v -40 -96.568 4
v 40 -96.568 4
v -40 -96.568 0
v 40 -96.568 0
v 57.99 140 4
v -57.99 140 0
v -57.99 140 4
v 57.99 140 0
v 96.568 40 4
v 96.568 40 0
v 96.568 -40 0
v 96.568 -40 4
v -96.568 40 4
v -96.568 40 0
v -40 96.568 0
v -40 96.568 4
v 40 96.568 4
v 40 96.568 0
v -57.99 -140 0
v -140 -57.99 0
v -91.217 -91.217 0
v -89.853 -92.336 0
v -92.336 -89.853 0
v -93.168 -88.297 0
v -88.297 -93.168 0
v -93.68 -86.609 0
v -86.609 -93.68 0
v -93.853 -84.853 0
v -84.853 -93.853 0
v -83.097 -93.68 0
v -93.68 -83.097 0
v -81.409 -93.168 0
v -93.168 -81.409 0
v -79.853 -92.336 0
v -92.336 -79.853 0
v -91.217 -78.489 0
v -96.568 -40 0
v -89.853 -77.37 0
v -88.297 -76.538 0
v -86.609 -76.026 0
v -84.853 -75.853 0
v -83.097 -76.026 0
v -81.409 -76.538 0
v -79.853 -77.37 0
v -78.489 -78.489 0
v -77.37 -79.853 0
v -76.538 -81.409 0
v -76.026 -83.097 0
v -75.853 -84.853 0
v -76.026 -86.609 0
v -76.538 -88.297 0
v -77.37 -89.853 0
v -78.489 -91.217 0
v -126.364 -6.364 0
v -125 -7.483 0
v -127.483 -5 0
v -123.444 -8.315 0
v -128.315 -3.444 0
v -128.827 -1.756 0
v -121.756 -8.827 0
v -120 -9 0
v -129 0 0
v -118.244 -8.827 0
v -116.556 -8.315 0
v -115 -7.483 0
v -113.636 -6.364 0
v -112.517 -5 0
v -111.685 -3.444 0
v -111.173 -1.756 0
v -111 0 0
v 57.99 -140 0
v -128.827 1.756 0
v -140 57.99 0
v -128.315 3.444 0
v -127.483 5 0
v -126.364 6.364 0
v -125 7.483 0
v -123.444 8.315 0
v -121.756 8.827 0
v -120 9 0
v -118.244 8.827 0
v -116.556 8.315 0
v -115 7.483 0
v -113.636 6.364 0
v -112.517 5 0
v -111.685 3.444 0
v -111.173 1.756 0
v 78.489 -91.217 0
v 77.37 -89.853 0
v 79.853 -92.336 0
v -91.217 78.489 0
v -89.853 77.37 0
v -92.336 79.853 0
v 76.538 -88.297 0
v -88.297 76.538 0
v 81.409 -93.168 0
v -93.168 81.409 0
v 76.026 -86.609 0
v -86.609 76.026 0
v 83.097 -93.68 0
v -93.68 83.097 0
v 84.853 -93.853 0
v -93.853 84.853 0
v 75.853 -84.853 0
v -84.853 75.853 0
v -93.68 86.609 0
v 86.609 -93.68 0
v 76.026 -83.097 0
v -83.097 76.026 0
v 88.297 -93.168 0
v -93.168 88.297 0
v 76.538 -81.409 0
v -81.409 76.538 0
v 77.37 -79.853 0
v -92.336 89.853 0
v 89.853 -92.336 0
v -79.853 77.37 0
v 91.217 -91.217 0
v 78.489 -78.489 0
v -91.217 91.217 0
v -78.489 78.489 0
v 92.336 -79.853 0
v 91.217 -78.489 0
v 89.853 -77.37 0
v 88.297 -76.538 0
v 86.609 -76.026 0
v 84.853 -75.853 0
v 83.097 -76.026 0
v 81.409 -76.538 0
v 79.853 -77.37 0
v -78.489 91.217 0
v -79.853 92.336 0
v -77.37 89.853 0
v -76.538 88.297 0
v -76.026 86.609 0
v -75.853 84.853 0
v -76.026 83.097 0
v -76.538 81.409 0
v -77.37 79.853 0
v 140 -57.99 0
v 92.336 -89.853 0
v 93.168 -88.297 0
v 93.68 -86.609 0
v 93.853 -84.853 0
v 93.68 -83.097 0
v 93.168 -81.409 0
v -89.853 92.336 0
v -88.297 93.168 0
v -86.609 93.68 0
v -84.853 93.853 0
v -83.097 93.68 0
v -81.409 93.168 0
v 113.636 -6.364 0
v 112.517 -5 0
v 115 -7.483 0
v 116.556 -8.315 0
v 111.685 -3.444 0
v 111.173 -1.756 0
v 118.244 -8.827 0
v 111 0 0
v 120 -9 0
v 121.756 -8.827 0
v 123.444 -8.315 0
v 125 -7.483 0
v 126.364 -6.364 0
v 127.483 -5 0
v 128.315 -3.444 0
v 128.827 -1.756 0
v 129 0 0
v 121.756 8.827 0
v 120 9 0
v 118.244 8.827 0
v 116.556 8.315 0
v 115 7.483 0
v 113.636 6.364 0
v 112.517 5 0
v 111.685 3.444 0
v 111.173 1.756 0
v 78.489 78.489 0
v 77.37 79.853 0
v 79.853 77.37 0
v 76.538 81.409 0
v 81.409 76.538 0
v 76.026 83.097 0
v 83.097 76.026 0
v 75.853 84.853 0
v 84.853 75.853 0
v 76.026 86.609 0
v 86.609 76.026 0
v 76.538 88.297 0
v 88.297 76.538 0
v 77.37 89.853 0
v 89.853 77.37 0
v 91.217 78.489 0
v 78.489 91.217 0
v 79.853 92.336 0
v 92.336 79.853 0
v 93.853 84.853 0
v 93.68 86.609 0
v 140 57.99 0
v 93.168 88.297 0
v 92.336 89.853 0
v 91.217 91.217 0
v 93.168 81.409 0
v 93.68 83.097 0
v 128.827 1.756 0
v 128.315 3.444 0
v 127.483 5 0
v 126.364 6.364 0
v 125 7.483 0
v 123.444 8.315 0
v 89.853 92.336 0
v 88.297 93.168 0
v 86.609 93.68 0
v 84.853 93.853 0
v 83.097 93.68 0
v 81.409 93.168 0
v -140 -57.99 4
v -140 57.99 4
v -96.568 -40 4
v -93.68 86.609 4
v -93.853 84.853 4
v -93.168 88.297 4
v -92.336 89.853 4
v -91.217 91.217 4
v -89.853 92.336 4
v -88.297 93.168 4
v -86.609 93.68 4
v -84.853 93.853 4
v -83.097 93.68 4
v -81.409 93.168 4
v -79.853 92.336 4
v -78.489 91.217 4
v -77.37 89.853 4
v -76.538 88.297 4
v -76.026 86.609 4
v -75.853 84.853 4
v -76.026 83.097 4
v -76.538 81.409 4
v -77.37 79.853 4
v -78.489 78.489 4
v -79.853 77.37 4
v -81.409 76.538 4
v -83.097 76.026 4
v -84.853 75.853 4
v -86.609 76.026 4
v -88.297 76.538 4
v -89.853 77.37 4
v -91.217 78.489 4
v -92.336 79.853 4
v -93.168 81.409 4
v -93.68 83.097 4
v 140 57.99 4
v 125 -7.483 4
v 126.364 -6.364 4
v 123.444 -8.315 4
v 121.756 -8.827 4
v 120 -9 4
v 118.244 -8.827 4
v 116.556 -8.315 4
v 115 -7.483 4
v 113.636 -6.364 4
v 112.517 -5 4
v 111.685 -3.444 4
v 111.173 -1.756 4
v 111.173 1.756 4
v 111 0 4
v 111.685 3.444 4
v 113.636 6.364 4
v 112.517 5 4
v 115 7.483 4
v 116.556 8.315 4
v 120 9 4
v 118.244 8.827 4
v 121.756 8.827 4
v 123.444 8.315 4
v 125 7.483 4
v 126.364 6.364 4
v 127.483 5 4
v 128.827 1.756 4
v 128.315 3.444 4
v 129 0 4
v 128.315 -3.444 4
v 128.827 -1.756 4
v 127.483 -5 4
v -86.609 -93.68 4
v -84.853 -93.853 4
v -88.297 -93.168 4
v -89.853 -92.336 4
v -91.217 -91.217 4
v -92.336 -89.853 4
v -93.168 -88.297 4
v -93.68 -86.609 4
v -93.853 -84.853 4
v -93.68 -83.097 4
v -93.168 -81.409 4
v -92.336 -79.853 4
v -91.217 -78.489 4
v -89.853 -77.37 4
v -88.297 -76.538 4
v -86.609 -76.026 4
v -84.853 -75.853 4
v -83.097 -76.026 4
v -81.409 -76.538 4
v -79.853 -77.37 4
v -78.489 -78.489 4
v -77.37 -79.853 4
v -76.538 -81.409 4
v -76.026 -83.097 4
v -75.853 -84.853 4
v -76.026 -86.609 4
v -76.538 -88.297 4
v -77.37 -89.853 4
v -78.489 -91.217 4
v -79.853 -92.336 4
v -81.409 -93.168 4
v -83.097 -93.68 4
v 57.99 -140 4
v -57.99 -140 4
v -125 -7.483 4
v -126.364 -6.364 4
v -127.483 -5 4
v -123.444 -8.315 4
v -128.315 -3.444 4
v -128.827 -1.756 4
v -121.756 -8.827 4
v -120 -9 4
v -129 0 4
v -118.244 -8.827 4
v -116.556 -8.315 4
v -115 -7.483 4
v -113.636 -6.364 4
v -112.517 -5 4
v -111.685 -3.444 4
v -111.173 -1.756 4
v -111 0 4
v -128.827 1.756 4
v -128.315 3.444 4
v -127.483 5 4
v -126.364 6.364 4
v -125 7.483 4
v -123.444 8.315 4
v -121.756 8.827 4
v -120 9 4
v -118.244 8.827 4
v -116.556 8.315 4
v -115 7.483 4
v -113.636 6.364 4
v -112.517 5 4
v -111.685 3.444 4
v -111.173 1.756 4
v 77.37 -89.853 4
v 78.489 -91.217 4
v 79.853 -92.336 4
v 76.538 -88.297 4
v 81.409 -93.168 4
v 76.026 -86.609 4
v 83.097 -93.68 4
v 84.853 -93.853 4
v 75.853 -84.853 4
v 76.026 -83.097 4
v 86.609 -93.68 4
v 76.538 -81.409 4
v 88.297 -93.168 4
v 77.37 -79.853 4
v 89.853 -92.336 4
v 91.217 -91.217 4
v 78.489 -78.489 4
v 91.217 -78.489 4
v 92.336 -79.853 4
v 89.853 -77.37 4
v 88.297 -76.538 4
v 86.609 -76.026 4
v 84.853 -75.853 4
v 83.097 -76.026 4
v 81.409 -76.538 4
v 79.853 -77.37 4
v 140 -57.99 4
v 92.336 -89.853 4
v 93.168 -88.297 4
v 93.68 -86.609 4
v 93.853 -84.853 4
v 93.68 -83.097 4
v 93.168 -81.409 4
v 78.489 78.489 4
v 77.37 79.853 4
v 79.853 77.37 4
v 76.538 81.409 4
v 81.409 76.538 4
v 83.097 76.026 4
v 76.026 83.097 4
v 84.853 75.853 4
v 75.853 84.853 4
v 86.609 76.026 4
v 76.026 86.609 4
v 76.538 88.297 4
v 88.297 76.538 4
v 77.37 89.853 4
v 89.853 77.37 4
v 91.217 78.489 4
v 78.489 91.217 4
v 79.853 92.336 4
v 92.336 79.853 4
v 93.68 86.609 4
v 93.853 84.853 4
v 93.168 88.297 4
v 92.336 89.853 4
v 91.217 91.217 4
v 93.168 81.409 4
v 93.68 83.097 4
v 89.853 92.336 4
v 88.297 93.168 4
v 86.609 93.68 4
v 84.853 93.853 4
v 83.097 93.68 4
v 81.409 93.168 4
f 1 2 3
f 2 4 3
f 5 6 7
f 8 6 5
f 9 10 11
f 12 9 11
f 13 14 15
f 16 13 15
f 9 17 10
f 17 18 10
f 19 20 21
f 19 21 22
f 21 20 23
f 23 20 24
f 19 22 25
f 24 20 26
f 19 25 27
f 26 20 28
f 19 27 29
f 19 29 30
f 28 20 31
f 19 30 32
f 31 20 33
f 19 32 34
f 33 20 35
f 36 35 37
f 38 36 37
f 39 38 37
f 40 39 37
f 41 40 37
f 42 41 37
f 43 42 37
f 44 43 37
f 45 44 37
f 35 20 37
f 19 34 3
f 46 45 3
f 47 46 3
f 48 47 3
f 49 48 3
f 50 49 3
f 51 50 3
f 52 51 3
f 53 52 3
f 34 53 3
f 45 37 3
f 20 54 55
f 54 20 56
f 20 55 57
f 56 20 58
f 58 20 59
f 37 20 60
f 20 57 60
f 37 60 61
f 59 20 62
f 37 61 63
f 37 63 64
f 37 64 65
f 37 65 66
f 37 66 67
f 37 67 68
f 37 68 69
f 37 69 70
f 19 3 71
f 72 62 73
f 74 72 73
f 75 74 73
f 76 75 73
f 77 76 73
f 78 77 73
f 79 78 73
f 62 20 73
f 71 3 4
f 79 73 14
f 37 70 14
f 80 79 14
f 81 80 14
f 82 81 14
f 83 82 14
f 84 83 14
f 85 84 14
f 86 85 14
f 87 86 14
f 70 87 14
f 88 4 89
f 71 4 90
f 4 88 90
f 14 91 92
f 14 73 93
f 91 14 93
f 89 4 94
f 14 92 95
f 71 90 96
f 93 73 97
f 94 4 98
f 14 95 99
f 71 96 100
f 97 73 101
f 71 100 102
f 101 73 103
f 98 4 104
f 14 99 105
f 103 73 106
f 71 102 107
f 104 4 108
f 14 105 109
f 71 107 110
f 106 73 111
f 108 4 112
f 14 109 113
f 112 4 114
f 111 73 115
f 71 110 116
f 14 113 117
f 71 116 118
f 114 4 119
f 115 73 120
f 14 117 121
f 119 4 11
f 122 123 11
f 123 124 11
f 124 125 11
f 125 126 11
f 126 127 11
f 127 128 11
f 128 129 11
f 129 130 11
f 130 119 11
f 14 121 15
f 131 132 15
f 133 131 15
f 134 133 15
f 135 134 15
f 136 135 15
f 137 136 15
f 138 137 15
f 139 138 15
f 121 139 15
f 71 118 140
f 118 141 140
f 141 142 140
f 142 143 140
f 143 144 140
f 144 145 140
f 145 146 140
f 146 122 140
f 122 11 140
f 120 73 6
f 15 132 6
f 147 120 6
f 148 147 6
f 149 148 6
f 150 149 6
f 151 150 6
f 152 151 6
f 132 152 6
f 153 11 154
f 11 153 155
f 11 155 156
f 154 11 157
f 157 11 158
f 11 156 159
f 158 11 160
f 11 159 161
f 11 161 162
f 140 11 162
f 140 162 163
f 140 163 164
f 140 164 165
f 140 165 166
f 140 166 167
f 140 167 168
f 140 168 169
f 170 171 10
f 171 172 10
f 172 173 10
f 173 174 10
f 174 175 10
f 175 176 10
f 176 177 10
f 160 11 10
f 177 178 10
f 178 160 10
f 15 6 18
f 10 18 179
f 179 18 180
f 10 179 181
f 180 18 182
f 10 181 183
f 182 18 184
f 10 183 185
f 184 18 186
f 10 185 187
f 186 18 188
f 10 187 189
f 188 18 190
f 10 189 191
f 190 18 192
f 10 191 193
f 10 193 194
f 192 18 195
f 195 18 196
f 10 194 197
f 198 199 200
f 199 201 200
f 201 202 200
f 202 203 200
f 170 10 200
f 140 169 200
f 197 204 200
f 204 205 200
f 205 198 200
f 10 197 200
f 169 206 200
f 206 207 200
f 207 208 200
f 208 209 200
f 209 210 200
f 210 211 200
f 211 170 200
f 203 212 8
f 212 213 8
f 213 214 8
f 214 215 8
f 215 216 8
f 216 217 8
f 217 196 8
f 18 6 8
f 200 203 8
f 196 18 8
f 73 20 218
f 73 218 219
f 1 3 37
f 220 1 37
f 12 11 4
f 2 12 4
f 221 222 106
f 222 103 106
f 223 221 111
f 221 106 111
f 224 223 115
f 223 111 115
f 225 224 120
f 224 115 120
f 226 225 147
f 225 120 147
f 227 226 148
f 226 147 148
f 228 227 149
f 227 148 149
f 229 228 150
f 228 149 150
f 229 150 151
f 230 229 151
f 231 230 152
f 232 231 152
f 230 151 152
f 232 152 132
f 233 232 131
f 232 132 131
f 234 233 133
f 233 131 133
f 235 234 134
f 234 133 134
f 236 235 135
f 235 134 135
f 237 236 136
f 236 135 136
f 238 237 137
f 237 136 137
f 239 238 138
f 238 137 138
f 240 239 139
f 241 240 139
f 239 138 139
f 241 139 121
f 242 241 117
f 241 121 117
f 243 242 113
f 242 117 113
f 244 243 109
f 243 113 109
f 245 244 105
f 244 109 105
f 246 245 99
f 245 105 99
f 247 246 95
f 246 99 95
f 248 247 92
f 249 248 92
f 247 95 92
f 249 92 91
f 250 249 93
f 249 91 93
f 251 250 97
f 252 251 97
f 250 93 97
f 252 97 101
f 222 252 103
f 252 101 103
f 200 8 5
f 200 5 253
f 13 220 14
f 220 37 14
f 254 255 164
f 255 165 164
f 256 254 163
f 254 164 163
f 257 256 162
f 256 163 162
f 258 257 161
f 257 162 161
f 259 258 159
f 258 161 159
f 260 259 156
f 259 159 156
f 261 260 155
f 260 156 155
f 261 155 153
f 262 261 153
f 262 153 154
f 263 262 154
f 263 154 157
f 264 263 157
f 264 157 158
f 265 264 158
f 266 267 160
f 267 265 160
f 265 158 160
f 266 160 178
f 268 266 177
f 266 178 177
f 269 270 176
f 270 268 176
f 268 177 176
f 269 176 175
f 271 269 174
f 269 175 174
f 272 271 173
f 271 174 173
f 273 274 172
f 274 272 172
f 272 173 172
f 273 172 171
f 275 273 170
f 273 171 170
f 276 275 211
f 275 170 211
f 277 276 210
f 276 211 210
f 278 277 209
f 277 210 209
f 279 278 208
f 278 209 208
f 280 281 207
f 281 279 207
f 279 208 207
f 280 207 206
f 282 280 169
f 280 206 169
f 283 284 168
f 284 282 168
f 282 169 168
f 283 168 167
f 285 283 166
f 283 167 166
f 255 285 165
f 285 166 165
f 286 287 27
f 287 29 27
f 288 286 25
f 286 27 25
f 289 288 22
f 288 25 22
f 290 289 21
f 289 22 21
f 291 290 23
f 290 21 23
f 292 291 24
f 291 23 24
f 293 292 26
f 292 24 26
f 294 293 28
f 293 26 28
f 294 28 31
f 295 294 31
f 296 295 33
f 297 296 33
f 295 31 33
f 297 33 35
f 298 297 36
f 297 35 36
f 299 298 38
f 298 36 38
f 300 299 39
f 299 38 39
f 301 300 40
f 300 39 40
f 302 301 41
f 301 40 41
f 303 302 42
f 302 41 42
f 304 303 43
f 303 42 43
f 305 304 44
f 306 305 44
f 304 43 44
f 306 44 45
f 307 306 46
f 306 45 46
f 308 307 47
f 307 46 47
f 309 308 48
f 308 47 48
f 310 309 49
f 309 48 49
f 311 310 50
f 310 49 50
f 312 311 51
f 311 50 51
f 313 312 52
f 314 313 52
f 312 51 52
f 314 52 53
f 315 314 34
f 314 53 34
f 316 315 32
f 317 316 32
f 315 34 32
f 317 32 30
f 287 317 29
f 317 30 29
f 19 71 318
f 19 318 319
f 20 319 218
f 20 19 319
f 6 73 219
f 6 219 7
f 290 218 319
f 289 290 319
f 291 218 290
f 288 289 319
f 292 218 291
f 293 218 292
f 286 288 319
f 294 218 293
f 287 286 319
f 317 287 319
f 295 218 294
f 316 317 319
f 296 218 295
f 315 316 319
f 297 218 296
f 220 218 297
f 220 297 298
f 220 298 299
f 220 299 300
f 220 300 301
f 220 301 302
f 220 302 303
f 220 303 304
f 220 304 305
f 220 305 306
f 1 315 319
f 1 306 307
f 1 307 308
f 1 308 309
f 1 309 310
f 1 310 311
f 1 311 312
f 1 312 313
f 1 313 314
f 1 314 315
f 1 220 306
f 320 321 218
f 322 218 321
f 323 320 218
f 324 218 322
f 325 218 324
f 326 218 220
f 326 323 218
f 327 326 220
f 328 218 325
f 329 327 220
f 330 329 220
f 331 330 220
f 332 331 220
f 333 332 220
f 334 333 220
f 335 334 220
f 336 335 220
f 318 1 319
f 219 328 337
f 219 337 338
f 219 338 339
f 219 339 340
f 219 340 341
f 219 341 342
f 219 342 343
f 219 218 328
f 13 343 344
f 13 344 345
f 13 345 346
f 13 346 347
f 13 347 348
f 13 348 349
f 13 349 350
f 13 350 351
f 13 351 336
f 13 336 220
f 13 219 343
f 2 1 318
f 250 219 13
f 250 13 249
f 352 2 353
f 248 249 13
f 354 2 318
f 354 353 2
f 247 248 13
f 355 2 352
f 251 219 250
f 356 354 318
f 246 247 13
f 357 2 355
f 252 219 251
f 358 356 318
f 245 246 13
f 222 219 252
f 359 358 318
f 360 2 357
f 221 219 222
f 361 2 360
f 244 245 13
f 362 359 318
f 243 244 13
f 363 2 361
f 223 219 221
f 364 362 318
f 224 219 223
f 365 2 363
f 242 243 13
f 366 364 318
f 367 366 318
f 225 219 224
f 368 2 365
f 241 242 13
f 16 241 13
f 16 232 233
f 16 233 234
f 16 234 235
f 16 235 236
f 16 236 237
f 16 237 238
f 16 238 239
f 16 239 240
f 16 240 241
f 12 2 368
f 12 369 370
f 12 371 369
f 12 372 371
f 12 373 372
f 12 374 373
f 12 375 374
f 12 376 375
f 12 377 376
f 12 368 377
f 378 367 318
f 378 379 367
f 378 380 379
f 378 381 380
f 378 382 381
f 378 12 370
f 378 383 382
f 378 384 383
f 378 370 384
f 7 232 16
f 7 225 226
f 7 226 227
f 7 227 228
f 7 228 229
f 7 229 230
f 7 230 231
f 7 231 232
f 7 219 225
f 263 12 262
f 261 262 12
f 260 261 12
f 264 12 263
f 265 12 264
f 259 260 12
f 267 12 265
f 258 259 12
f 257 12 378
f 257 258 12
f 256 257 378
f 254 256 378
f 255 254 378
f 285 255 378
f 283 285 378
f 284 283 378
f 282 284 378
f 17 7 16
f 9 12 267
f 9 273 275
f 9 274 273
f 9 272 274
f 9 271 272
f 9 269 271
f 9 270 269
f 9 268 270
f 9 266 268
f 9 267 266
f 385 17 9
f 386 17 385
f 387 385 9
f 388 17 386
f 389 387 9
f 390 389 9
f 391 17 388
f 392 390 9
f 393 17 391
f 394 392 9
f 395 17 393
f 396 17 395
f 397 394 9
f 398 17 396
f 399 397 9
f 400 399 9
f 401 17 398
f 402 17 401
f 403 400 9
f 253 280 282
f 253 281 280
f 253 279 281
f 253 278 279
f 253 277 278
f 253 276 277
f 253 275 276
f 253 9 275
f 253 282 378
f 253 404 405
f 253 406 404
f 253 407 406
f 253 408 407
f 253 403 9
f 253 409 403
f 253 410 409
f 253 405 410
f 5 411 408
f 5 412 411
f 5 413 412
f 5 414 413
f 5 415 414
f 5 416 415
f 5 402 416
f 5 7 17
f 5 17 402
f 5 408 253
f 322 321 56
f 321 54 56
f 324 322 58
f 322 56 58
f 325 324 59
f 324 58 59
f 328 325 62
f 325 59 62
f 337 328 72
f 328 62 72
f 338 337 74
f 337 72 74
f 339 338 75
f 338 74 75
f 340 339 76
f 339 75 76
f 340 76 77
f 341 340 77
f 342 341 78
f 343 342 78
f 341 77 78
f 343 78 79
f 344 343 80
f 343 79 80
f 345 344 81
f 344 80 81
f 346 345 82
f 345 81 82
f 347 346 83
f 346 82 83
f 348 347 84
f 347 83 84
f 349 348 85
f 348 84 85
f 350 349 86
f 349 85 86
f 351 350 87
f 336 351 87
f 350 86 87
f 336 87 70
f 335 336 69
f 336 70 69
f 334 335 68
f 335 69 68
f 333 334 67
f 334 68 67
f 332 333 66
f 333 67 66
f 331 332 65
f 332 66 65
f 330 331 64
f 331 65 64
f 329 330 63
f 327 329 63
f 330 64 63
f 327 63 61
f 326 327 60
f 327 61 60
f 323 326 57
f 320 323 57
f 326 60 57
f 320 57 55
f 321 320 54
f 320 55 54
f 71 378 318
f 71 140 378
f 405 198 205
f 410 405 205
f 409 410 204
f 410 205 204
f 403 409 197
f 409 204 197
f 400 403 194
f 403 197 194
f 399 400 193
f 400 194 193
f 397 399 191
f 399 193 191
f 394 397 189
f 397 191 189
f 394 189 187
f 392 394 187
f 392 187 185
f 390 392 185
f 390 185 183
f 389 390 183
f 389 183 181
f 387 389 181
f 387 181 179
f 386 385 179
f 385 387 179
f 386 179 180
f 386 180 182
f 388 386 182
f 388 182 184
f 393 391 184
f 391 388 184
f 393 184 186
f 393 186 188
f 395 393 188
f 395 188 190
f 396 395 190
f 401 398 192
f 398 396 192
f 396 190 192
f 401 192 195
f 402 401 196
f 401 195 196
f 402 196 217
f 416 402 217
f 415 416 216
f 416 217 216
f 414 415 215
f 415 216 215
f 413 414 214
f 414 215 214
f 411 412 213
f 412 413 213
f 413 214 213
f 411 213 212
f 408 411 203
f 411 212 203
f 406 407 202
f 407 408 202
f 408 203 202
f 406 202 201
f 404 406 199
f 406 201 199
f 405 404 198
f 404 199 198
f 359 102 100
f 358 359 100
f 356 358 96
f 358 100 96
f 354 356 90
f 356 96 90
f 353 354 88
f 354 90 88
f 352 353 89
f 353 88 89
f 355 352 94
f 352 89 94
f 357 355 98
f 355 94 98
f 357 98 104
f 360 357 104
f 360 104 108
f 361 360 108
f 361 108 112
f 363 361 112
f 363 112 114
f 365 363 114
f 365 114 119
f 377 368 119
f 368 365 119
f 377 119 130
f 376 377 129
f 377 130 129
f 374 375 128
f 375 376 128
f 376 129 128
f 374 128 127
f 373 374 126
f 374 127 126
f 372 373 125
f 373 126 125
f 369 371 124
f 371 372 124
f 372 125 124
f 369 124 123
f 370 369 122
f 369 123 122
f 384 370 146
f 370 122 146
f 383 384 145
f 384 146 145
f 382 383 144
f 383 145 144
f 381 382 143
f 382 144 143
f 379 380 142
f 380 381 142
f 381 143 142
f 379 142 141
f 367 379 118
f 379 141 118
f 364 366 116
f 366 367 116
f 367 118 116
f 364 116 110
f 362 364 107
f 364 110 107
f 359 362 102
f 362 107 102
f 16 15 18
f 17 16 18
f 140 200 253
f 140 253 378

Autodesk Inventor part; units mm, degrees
ref_plane "YZ Plane" through (0, 0, 0) normal (1, 0, 0) x (0, 1, 0)
ref_plane "XZ Plane" through (0, 0, 0) normal (0, 1, 0) x (-1, 0, 0)
ref_plane "XY Plane" through (0, 0, 0) normal (0, 0, 1) x (1, 0, 0)
sketch "Sketch1" plane through (0, 0, 0) normal (0, 0, 1) x (1, 0, 0)
  circle A0 centre (0, 0) radius 96.5685 construction
  circle A1 centre (0, 0) radius 140 construction
  line L0 (140, -140) -> (-140, -140)
  line L1 (-140, -140) -> (-140, 140)
  line L2 (-140, 140) -> (140, 140)
  line L3 (140, 140) -> (140, -140)
  line L4 (140, -140) -> (-140, 140) construction
  line L5 (-140, -140) -> (140, 140) construction
  line L6 (57.9899, 140) -> (140, 57.9899)
  line L7 (140, 57.9899) -> (140, -57.9899)
  line L8 (140, -57.9899) -> (57.9899, -140)
  line L9 (57.9899, -140) -> (-57.9899, -140)
  line L10 (-57.9899, -140) -> (-140, -57.9899)
  line L11 (-140, -57.9899) -> (-140, 57.9899)
  line L12 (-140, 57.9899) -> (-57.9899, 140)
  line L13 (-57.9899, 140) -> (57.9899, 140)
  line L14 (40, 96.5685) -> (96.5685, 40)
  line L15 (96.5685, 40) -> (96.5685, -40)
  line L16 (96.5685, -40) -> (40, -96.5685)
  line L17 (40, -96.5685) -> (-40, -96.5685)
  line L18 (-40, -96.5685) -> (-96.5685, -40)
  line L19 (-96.5685, -40) -> (-96.5685, 40)
  line L20 (-96.5685, 40) -> (-40, 96.5685)
  line L21 (-40, 96.5685) -> (40, 96.5685)
  point P0 (0, 140)
  point P1 (-57.9899, 140)
  point P2 (-140, 57.9899)
  point P3 (-140, -57.9899)
  point P4 (-57.9899, -140)
  point P5 (57.9899, -140)
  point P6 (140, -57.9899)
  point P7 (140, 57.9899)
  point P8 (57.9899, 140)
  point P9 (0, 96.5685)
  point P10 (0, 140)
  dimension "d23" = 280
  dimension "d41" = 80
  dimension "d42" = 43.4315
extrude "Plate1" add sketch "Sketch1" along normal blind 4 contours L0 L10 L1 L12 L2 L6 L3 L8
sketch "Sketch6" plane through (0, 0, 0) normal (0, 0, 1) x (1, 0, 0)
  line L0 (0, 0) -> (0, 120) construction
  circle A0 centre (0, 0) radius 120 construction
  line L1 (0, 0) -> (84.8528, 84.8528) construction
  circle A1 centre (84.8528, 84.8528) radius 9
  dimension "d32" = 18
  dimension "d33" = 240
  dimension "d34" = 45
extrude "Cut2" cut sketch "Sketch6" along normal blind 4
pattern_circular "Circular Pattern2" count 3 over 90 about axis through (0, 0, -10) along (0, 0, -1) of "Cut2"
mirror "Mirror1" about plane through (0, 0, 0) normal (1, 0, 0) of "Cut2", "Circular Pattern2"
equation "\"d23\" = Flange_D_outer"
equation "\"d32\" = Flange_d_hole_diam"
equation "\"d33\" = Flange_D1_hole_center"
equation "\"d35\" = Thickness"
equation "\"d2\" = Thickness"
equation "\"BendReliefWidth\" = Thickness"
equation "\"BendReliefDepth\" = 0.5 * Thickness"
equation "\"CornerReliefSize\" = 4 * Thickness"
equation "\"MinimumRemnant\" = 2 * Thickness"
equation "\"TransitionRadius\" = BendRadius"
equation "\"JacobiRadiusSize\" = BendRadius"
equation "\"GapSize\" = Thickness"
equation "\"Octaeder_flange_lenth\" = d42"
equation "\"Flange_D_outer\" = 280"
equation "\"Flange_d_hole_diam\" = 18"
equation "\"Flange_D1_hole_center\" = 240"
equation "\"Thickness\" = 4"
equation "\"BendRadius\" = 6"
properties part number "DSB 110 drain sustem flange" material "Stainless Steel"
